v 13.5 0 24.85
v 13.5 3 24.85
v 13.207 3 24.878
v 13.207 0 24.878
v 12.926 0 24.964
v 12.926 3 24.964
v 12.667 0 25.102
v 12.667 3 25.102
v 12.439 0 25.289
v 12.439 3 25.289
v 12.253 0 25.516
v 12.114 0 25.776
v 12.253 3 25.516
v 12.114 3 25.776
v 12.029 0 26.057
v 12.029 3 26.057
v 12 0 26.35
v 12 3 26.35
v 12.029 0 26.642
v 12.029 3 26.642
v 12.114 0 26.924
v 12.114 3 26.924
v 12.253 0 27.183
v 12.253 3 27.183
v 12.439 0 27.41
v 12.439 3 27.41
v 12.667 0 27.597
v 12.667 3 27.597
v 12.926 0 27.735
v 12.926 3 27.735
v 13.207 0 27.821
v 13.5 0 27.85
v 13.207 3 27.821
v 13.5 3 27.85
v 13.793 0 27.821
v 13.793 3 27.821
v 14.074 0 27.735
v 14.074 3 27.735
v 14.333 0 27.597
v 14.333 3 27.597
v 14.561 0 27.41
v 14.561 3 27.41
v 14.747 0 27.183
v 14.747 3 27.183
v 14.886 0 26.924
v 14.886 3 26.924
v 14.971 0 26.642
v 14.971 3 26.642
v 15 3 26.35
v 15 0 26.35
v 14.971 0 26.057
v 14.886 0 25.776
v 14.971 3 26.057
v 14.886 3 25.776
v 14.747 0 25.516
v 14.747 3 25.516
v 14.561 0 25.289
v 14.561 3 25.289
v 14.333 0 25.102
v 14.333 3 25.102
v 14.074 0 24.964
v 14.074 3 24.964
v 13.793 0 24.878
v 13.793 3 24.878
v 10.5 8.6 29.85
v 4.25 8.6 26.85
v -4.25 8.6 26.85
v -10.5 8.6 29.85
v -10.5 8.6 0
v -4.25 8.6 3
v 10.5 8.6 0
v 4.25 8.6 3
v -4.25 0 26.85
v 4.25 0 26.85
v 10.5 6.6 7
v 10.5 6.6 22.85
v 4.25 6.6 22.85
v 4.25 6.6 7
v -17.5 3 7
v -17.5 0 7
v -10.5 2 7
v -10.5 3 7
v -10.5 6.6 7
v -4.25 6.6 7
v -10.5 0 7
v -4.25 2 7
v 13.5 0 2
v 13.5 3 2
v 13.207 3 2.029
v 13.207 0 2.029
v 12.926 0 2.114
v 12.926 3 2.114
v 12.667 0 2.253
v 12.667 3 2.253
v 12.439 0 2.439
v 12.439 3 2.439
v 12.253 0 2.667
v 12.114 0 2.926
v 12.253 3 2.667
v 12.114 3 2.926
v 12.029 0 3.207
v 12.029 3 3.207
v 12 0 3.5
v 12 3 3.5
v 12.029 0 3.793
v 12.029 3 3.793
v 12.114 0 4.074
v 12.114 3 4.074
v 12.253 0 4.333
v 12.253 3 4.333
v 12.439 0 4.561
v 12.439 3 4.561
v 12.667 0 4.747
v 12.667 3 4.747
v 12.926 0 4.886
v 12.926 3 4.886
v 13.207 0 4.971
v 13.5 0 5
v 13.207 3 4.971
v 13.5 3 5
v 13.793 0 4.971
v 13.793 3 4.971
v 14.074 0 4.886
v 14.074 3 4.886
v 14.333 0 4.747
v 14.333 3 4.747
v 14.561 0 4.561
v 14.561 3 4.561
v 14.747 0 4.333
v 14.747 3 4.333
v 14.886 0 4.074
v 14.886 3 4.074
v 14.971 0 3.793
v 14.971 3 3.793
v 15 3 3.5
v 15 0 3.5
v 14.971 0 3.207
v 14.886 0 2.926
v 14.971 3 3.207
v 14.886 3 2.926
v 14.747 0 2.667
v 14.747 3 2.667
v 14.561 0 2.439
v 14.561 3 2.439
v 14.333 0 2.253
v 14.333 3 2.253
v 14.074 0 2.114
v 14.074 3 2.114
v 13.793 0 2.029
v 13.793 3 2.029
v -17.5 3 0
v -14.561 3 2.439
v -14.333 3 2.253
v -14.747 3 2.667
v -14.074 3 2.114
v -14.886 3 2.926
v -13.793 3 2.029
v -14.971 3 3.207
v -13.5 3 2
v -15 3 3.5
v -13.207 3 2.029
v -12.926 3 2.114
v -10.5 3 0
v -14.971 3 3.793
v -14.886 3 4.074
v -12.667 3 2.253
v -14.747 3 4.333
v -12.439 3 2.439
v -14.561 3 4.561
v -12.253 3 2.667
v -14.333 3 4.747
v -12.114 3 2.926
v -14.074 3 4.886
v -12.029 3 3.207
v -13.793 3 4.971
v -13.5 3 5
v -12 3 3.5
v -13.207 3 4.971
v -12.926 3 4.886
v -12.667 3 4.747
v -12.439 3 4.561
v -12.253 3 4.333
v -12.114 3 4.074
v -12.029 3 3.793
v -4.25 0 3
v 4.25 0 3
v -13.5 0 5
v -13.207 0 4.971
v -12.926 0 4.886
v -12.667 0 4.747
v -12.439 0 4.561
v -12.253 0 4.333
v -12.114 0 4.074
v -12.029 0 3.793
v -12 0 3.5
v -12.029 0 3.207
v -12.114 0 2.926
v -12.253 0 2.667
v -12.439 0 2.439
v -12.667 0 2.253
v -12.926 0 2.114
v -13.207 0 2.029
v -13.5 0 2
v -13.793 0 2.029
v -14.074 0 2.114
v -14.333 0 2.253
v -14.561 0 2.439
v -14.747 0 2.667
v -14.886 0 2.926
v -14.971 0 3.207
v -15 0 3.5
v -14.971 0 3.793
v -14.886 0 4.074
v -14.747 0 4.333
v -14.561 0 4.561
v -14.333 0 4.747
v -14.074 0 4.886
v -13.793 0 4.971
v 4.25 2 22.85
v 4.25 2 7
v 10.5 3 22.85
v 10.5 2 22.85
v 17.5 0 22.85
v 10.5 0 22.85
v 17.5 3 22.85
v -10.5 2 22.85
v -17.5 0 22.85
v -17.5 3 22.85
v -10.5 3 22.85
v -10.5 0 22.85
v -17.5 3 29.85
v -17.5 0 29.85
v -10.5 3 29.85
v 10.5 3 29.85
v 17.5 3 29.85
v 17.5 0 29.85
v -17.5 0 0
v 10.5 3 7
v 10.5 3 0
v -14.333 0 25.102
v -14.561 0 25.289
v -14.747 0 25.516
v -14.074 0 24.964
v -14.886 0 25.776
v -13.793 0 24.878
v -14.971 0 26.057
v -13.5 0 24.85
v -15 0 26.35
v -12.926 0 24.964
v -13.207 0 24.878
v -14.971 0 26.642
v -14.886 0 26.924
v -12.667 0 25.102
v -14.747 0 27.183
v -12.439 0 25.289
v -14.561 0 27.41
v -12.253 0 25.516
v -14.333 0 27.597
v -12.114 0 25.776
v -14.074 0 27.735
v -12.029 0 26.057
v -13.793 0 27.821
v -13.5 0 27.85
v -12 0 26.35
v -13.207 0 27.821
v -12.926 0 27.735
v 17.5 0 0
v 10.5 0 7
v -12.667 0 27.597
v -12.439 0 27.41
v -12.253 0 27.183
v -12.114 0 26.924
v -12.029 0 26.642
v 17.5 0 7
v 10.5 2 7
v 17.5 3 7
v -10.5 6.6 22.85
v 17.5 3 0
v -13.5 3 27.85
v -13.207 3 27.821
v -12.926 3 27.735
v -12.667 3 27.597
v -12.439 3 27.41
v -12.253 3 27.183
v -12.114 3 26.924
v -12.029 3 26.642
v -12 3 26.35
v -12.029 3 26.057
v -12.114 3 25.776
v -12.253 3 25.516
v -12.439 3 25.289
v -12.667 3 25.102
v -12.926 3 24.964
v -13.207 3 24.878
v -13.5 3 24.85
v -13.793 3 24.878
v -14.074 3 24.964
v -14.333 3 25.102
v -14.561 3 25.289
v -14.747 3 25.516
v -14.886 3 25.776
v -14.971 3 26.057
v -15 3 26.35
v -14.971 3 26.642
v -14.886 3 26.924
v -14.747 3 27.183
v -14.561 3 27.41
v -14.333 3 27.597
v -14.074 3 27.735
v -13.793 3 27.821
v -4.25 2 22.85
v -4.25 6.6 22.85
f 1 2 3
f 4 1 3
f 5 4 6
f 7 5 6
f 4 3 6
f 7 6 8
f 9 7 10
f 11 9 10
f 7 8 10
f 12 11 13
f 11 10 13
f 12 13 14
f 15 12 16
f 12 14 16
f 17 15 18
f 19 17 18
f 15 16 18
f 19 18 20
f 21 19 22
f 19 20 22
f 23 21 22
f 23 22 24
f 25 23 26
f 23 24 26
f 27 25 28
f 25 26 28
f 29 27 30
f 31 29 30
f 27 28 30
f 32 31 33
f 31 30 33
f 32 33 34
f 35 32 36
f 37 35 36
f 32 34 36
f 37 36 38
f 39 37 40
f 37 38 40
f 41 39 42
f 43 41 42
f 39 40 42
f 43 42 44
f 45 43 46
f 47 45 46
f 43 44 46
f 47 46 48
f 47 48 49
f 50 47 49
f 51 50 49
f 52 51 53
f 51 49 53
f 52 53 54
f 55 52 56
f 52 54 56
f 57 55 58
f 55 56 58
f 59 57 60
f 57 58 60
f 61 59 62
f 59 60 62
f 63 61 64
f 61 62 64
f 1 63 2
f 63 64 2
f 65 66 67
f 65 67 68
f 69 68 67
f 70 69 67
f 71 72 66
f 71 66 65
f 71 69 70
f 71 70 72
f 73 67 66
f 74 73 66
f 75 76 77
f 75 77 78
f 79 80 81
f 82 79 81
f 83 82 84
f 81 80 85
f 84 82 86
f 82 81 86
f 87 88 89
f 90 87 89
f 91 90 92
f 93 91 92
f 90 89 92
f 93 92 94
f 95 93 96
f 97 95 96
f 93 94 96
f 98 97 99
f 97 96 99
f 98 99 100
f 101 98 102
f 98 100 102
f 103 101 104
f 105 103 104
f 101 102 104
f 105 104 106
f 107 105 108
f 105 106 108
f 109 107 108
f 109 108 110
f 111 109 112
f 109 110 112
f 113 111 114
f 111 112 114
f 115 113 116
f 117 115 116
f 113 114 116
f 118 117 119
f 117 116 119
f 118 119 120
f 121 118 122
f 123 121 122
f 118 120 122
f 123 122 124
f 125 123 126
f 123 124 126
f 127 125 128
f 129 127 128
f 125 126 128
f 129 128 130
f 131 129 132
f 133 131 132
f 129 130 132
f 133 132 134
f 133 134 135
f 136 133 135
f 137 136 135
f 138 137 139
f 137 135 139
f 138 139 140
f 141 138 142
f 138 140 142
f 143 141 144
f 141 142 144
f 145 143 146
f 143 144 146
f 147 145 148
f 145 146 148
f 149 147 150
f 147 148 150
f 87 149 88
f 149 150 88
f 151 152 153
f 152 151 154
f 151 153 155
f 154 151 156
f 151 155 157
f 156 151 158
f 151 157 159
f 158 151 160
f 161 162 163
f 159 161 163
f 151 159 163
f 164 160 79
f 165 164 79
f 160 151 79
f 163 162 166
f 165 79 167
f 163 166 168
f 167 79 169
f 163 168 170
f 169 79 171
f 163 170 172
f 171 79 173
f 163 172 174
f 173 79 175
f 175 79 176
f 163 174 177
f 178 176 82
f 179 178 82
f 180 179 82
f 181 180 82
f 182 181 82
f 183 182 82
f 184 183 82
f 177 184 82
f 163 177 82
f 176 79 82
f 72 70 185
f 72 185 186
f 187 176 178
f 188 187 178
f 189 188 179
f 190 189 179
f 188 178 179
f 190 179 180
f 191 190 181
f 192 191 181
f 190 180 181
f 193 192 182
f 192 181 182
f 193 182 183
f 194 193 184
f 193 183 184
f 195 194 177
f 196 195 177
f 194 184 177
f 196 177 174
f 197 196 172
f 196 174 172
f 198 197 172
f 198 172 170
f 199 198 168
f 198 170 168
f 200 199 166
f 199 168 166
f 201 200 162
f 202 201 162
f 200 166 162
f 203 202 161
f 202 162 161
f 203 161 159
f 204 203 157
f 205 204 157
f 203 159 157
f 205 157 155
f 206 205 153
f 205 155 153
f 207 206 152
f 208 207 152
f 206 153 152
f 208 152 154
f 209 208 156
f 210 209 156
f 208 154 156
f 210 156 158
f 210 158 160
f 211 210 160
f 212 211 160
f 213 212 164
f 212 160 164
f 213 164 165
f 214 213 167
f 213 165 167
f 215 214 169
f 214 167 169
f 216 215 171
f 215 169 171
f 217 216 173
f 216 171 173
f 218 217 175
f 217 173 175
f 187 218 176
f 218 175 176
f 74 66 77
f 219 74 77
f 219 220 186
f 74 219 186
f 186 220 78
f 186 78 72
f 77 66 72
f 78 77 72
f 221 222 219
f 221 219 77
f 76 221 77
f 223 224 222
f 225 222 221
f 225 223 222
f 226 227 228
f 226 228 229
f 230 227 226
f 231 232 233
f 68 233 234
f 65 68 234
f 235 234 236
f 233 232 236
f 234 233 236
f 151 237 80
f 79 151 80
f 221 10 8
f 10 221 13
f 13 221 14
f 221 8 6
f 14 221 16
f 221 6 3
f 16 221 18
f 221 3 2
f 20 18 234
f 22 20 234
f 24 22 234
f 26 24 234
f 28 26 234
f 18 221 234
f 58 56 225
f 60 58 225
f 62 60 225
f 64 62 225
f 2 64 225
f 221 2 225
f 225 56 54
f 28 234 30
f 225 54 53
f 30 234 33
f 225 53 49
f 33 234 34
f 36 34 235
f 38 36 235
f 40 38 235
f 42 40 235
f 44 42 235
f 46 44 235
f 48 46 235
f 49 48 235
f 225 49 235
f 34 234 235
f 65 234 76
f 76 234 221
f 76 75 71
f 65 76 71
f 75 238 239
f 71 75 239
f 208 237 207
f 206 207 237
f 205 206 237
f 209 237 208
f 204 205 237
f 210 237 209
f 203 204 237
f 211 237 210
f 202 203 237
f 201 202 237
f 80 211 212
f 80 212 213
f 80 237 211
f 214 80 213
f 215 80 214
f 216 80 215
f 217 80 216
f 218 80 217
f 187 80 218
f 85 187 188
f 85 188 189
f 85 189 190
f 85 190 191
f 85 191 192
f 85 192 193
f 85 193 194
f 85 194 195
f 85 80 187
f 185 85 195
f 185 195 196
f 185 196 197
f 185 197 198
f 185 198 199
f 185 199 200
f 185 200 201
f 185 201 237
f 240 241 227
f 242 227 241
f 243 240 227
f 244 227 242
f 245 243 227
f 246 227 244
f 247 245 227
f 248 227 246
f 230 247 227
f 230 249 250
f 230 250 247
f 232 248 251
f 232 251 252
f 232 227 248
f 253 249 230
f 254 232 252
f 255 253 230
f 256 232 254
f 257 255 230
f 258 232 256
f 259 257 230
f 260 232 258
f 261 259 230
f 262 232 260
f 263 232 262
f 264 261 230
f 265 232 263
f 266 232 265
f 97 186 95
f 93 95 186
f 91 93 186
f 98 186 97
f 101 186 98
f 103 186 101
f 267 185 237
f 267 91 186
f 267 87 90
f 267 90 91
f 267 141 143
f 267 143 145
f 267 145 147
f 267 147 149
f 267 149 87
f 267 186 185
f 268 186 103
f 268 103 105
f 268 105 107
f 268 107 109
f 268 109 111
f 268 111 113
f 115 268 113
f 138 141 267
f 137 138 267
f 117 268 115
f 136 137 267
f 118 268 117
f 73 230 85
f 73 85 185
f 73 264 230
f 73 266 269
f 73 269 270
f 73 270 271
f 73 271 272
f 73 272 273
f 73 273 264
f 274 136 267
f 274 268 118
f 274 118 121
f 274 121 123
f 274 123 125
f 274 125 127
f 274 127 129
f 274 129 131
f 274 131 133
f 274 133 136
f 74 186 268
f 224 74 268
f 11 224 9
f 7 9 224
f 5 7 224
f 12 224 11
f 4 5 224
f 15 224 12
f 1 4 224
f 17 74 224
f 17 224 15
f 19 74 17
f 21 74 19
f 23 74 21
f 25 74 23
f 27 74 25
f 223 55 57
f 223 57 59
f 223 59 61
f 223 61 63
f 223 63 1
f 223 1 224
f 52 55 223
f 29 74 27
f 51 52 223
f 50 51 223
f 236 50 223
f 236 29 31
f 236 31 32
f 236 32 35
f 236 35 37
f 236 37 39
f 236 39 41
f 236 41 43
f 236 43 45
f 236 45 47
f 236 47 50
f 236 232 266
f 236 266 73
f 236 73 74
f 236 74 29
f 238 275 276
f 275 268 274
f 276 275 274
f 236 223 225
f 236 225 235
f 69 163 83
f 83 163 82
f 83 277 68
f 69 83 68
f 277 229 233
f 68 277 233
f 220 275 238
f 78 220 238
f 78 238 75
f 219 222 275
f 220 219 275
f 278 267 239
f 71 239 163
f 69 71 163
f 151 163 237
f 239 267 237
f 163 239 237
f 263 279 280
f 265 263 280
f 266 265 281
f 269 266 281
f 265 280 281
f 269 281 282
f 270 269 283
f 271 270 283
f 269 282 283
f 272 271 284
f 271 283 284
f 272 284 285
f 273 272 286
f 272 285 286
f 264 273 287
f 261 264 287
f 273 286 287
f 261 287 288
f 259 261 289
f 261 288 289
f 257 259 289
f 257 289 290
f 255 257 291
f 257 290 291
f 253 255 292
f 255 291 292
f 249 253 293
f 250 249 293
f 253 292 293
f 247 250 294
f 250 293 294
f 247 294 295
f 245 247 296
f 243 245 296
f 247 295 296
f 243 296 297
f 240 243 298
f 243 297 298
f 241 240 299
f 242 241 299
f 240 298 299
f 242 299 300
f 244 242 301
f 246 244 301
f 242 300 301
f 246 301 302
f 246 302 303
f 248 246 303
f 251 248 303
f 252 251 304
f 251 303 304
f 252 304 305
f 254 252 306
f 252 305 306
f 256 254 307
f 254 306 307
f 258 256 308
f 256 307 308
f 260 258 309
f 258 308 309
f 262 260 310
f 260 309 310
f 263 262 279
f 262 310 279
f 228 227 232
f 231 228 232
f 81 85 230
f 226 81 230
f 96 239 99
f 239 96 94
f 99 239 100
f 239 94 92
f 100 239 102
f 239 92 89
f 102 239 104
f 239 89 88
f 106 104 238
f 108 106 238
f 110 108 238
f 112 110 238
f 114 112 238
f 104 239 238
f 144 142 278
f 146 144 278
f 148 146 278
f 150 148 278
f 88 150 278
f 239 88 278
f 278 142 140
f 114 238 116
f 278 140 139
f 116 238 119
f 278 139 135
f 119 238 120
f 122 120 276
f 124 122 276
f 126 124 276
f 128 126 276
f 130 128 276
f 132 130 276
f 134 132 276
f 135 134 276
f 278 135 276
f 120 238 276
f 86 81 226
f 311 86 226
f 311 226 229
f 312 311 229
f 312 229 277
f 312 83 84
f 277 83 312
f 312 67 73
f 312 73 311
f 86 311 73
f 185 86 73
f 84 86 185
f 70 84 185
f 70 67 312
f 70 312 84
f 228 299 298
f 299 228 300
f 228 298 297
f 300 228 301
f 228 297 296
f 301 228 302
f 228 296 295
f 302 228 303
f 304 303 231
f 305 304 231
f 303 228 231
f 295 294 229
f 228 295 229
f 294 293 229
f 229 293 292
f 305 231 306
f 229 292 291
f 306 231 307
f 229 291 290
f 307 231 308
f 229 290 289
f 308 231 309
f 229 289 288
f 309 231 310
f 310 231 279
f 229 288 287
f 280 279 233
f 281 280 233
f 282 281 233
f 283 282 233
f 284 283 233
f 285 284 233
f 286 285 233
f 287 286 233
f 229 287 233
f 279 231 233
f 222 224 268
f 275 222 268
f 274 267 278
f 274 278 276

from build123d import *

# Parameters (mm, degrees)
BOSS_EXTRUDE1_DEPTH = 8.6
SKETCH5_W           = 8.5
SKETCH5_H           = 23.85
CUT_EXTRUDE3_DEPTH  = 10
SKETCH6_W           = 15.85
SKETCH6_H           = 4.6
CUT_EXTRUDE4_DEPTH  = 10
SKETCH7_W           = 15.85
SKETCH7_H           = 4.6
CUT_EXTRUDE5_DEPTH  = 10
SKETCH9_W           = 7
SKETCH9_H           = 7
BOSS_EXTRUDE3_DEPTH = 3
SKETCH10_R          = 1.5
CUT_EXTRUDE6_DEPTH  = 3


with BuildPart() as part:
    # Sketch1 → Boss-Extrude1 (new body)
    with BuildSketch(Plane(origin=(0, 0, 0), x_dir=(1, 0, 0), z_dir=(0, 1, 0))):
        Polygon((-10.5, 0), (-10.5, -24.849623113), (-10.5, -29.849623113), (7.5, -29.849623113), (10.5, -29.849623113), (10.5, -24.849623113), (10.5, 0), align=None)
    extrude(amount=BOSS_EXTRUDE1_DEPTH)

    # Sketch5 → Cut-Extrude3 (cut)
    with BuildSketch(Plane(origin=(0, 8.6, 0), x_dir=(1, 0, 0), z_dir=(0, 1, 0))):
        with Locations((0, -14.924623113)):
            Rectangle(SKETCH5_W, SKETCH5_H)
    extrude(amount=-CUT_EXTRUDE3_DEPTH, mode=Mode.SUBTRACT)

    # Sketch6 → Cut-Extrude4 (cut)
    with BuildSketch(Plane.ZY.offset(10.5)):
        with Locations((14.925, 4.3)):
            Rectangle(SKETCH6_W, SKETCH6_H)
    extrude(amount=-CUT_EXTRUDE4_DEPTH, mode=Mode.SUBTRACT)

    # Sketch7 → Cut-Extrude5 (cut)
    with BuildSketch(Plane(origin=(10.5, 0, 0), x_dir=(0, 0, -1), z_dir=(1, 0, 0))):
        with Locations((-14.924623113, 4.3)):
            Rectangle(SKETCH7_W, SKETCH7_H)
    extrude(amount=-CUT_EXTRUDE5_DEPTH, mode=Mode.SUBTRACT)

    # Sketch9 → Boss-Extrude3 (add)
    with BuildSketch(Plane.XZ):
        with Locations((-14, 26.349623113)):
            Rectangle(SKETCH9_W, SKETCH9_H)
        with Locations((14, 26.349623113)):
            Rectangle(SKETCH9_W, SKETCH9_H)
        with Locations((-14, 3.5)):
            Rectangle(SKETCH9_W, SKETCH9_H)
        with Locations((14, 3.5)):
            Rectangle(SKETCH9_W, SKETCH9_H)
    extrude(amount=-BOSS_EXTRUDE3_DEPTH)

    # Sketch10 → Cut-Extrude6 (cut)
    with BuildSketch(Plane(origin=(0, 3, 0), x_dir=(1, 0, 0), z_dir=(0, 1, 0))):
        with Locations(Location((-13.5, -3.5, 0), (0, 0, 270))):
            Circle(SKETCH10_R)
        with Locations(Location((-13.5, -26.349623113, 0), (0, 0, 270))):
            Circle(SKETCH10_R)
        with Locations(Location((13.5, -26.349623113, 0), (0, 0, 90))):
            Circle(SKETCH10_R)
        with Locations(Location((13.5, -3.5, 0), (0, 0, 90))):
            Circle(SKETCH10_R)
    extrude(amount=-CUT_EXTRUDE6_DEPTH, mode=Mode.SUBTRACT)


solid = part.part
